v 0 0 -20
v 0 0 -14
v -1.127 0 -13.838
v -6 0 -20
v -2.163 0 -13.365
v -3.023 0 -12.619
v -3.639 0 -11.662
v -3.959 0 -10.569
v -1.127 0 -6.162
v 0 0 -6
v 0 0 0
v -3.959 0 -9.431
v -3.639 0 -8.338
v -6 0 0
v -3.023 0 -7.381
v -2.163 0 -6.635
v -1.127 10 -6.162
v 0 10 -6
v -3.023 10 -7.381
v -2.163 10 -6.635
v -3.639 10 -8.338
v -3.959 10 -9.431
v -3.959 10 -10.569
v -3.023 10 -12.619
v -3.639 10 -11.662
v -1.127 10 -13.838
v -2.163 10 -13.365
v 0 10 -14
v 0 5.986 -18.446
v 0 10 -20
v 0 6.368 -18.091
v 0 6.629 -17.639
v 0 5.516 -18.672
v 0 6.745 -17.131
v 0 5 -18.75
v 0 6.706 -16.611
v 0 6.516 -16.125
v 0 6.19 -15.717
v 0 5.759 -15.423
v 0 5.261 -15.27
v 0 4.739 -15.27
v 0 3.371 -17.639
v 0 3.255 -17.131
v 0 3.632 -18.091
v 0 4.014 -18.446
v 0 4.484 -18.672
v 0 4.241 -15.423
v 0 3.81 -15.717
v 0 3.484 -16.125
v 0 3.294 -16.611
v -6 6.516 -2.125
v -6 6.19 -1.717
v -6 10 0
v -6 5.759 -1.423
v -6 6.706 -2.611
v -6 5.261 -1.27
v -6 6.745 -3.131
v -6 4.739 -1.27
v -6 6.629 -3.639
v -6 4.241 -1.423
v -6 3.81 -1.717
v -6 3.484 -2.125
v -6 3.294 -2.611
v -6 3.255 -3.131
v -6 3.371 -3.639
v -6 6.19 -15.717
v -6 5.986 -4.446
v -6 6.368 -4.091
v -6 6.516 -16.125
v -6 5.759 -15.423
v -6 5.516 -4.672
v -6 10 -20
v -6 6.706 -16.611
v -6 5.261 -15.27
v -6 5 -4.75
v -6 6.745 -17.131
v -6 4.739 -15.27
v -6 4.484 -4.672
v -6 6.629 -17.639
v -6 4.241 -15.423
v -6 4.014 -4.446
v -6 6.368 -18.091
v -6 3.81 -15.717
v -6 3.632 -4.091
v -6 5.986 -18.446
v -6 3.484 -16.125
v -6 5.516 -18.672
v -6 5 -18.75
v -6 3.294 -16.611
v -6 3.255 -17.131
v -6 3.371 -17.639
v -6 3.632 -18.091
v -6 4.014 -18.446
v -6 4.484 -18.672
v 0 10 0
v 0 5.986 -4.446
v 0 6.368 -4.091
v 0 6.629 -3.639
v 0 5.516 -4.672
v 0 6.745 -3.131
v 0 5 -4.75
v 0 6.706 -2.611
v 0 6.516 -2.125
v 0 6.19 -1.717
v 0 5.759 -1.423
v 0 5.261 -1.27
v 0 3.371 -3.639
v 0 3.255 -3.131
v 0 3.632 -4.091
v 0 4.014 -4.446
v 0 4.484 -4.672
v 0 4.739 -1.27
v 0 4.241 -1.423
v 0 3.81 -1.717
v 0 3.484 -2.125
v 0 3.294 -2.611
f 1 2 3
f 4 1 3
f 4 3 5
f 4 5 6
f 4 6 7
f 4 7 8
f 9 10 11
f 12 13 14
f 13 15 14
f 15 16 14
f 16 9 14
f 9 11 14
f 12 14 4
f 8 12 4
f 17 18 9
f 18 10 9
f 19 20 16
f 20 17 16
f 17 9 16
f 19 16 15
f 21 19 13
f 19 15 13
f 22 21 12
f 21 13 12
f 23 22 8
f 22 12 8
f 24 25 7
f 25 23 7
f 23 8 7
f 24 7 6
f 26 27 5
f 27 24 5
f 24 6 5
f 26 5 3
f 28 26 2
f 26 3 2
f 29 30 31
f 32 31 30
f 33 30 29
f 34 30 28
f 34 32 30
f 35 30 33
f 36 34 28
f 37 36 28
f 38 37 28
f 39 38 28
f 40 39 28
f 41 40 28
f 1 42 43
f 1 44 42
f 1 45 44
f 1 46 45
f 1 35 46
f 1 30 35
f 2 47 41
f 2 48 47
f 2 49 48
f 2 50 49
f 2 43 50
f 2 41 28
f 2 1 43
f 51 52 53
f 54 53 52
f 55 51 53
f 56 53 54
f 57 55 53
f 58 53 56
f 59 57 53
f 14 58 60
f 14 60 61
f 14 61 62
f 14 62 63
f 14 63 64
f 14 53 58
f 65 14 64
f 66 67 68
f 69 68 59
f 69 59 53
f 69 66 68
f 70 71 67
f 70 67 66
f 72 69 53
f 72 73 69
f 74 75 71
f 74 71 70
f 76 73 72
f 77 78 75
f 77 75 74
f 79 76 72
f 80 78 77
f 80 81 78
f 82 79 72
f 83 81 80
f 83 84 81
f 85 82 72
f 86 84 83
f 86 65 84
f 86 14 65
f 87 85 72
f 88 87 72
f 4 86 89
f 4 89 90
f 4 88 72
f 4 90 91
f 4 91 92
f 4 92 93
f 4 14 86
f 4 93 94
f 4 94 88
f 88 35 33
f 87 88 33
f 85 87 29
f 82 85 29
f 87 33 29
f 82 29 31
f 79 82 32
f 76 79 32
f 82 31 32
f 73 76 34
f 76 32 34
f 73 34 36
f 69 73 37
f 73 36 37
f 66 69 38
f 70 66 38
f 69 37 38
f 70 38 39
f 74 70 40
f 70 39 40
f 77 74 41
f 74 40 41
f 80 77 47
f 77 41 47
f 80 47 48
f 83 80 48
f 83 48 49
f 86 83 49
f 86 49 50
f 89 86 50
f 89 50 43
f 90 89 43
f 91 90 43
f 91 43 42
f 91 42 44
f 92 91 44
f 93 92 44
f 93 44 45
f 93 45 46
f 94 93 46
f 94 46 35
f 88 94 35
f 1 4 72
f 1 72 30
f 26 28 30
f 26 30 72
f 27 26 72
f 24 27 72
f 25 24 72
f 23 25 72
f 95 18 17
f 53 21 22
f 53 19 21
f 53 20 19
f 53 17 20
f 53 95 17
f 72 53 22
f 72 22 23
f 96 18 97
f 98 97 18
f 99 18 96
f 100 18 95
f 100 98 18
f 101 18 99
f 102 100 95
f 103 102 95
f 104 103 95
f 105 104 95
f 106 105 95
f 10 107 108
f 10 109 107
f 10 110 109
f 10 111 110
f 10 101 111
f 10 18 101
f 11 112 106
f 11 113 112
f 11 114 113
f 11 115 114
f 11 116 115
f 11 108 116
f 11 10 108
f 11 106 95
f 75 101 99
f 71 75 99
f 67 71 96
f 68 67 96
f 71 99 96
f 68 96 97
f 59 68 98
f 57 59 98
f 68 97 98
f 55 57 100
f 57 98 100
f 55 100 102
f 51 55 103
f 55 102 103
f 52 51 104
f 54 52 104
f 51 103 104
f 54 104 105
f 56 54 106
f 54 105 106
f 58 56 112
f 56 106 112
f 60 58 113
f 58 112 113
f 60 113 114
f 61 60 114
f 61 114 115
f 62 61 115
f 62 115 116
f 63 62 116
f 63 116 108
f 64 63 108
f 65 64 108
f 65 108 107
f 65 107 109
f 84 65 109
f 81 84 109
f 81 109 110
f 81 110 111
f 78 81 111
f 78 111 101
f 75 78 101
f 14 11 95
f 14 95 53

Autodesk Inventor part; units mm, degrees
ref_plane "YZ Plane" through (0, 0, 0) normal (1, 0, 0) x (0, 1, 0)
ref_plane "XZ Plane" through (0, 0, 0) normal (0, 1, 0) x (-1, 0, 0)
ref_plane "XY Plane" through (0, 0, 0) normal (0, 0, 1) x (1, 0, 0)
sketch "Sketch1" plane through (0, 0, 0) normal (0, 1, 0) x (-1, 0, 0)
  line L0 (0, 0) -> (6, 0)
  line L1 (6, 0) -> (6, -20)
  line L2 (6, -20) -> (0, -20)
  arc A0 (0, -14) -> (0, -6) centre (0, -10) ccw
  line L3 (0, -20) -> (0, -14)
  line L4 (0, -6) -> (0, 0)
  dimension "d0" = 6
  dimension "d1" = 20
  dimension "d2" = 6
  dimension "d3" = 20
  dimension "d8" = 8
  dimension "d11" = 90
  dimension "d14" = 6
  dimension "d15" = 6
extrude "Extrusion1" add sketch "Sketch1" along normal blind 10
sketch "Sketch2" plane through (0, 0, 0) normal (1, 0, 0) x (0, 0, -1)
  line L0 (20, 0) -> (14, 0) projected
  line L1 (20, 0) -> (20, 10) projected
  line L2 (14, 10) -> (20, 10) projected
  line L3 (14, 0) -> (14, 10) projected
  line L4 (6, 0) -> (0, 0) projected
  line L5 (6, 0) -> (6, 10) projected
  line L6 (0, 10) -> (6, 10) projected
  line L7 (0, 0) -> (0, 10) projected
  circle A0 centre (17, 5) radius 1.75
  circle A1 centre (3, 5) radius 1.75
  dimension "d17" = 3.5
  dimension "d18" = 3.5
  dimension "d20" = 14
  dimension "d21" = 5
  dimension "d22" = 3
  dimension "d23" = 5
extrude "Extrusion2" cut sketch "Sketch2" against normal through all contours A0 | A1
properties part number "reverse gear connecting rod 1"
